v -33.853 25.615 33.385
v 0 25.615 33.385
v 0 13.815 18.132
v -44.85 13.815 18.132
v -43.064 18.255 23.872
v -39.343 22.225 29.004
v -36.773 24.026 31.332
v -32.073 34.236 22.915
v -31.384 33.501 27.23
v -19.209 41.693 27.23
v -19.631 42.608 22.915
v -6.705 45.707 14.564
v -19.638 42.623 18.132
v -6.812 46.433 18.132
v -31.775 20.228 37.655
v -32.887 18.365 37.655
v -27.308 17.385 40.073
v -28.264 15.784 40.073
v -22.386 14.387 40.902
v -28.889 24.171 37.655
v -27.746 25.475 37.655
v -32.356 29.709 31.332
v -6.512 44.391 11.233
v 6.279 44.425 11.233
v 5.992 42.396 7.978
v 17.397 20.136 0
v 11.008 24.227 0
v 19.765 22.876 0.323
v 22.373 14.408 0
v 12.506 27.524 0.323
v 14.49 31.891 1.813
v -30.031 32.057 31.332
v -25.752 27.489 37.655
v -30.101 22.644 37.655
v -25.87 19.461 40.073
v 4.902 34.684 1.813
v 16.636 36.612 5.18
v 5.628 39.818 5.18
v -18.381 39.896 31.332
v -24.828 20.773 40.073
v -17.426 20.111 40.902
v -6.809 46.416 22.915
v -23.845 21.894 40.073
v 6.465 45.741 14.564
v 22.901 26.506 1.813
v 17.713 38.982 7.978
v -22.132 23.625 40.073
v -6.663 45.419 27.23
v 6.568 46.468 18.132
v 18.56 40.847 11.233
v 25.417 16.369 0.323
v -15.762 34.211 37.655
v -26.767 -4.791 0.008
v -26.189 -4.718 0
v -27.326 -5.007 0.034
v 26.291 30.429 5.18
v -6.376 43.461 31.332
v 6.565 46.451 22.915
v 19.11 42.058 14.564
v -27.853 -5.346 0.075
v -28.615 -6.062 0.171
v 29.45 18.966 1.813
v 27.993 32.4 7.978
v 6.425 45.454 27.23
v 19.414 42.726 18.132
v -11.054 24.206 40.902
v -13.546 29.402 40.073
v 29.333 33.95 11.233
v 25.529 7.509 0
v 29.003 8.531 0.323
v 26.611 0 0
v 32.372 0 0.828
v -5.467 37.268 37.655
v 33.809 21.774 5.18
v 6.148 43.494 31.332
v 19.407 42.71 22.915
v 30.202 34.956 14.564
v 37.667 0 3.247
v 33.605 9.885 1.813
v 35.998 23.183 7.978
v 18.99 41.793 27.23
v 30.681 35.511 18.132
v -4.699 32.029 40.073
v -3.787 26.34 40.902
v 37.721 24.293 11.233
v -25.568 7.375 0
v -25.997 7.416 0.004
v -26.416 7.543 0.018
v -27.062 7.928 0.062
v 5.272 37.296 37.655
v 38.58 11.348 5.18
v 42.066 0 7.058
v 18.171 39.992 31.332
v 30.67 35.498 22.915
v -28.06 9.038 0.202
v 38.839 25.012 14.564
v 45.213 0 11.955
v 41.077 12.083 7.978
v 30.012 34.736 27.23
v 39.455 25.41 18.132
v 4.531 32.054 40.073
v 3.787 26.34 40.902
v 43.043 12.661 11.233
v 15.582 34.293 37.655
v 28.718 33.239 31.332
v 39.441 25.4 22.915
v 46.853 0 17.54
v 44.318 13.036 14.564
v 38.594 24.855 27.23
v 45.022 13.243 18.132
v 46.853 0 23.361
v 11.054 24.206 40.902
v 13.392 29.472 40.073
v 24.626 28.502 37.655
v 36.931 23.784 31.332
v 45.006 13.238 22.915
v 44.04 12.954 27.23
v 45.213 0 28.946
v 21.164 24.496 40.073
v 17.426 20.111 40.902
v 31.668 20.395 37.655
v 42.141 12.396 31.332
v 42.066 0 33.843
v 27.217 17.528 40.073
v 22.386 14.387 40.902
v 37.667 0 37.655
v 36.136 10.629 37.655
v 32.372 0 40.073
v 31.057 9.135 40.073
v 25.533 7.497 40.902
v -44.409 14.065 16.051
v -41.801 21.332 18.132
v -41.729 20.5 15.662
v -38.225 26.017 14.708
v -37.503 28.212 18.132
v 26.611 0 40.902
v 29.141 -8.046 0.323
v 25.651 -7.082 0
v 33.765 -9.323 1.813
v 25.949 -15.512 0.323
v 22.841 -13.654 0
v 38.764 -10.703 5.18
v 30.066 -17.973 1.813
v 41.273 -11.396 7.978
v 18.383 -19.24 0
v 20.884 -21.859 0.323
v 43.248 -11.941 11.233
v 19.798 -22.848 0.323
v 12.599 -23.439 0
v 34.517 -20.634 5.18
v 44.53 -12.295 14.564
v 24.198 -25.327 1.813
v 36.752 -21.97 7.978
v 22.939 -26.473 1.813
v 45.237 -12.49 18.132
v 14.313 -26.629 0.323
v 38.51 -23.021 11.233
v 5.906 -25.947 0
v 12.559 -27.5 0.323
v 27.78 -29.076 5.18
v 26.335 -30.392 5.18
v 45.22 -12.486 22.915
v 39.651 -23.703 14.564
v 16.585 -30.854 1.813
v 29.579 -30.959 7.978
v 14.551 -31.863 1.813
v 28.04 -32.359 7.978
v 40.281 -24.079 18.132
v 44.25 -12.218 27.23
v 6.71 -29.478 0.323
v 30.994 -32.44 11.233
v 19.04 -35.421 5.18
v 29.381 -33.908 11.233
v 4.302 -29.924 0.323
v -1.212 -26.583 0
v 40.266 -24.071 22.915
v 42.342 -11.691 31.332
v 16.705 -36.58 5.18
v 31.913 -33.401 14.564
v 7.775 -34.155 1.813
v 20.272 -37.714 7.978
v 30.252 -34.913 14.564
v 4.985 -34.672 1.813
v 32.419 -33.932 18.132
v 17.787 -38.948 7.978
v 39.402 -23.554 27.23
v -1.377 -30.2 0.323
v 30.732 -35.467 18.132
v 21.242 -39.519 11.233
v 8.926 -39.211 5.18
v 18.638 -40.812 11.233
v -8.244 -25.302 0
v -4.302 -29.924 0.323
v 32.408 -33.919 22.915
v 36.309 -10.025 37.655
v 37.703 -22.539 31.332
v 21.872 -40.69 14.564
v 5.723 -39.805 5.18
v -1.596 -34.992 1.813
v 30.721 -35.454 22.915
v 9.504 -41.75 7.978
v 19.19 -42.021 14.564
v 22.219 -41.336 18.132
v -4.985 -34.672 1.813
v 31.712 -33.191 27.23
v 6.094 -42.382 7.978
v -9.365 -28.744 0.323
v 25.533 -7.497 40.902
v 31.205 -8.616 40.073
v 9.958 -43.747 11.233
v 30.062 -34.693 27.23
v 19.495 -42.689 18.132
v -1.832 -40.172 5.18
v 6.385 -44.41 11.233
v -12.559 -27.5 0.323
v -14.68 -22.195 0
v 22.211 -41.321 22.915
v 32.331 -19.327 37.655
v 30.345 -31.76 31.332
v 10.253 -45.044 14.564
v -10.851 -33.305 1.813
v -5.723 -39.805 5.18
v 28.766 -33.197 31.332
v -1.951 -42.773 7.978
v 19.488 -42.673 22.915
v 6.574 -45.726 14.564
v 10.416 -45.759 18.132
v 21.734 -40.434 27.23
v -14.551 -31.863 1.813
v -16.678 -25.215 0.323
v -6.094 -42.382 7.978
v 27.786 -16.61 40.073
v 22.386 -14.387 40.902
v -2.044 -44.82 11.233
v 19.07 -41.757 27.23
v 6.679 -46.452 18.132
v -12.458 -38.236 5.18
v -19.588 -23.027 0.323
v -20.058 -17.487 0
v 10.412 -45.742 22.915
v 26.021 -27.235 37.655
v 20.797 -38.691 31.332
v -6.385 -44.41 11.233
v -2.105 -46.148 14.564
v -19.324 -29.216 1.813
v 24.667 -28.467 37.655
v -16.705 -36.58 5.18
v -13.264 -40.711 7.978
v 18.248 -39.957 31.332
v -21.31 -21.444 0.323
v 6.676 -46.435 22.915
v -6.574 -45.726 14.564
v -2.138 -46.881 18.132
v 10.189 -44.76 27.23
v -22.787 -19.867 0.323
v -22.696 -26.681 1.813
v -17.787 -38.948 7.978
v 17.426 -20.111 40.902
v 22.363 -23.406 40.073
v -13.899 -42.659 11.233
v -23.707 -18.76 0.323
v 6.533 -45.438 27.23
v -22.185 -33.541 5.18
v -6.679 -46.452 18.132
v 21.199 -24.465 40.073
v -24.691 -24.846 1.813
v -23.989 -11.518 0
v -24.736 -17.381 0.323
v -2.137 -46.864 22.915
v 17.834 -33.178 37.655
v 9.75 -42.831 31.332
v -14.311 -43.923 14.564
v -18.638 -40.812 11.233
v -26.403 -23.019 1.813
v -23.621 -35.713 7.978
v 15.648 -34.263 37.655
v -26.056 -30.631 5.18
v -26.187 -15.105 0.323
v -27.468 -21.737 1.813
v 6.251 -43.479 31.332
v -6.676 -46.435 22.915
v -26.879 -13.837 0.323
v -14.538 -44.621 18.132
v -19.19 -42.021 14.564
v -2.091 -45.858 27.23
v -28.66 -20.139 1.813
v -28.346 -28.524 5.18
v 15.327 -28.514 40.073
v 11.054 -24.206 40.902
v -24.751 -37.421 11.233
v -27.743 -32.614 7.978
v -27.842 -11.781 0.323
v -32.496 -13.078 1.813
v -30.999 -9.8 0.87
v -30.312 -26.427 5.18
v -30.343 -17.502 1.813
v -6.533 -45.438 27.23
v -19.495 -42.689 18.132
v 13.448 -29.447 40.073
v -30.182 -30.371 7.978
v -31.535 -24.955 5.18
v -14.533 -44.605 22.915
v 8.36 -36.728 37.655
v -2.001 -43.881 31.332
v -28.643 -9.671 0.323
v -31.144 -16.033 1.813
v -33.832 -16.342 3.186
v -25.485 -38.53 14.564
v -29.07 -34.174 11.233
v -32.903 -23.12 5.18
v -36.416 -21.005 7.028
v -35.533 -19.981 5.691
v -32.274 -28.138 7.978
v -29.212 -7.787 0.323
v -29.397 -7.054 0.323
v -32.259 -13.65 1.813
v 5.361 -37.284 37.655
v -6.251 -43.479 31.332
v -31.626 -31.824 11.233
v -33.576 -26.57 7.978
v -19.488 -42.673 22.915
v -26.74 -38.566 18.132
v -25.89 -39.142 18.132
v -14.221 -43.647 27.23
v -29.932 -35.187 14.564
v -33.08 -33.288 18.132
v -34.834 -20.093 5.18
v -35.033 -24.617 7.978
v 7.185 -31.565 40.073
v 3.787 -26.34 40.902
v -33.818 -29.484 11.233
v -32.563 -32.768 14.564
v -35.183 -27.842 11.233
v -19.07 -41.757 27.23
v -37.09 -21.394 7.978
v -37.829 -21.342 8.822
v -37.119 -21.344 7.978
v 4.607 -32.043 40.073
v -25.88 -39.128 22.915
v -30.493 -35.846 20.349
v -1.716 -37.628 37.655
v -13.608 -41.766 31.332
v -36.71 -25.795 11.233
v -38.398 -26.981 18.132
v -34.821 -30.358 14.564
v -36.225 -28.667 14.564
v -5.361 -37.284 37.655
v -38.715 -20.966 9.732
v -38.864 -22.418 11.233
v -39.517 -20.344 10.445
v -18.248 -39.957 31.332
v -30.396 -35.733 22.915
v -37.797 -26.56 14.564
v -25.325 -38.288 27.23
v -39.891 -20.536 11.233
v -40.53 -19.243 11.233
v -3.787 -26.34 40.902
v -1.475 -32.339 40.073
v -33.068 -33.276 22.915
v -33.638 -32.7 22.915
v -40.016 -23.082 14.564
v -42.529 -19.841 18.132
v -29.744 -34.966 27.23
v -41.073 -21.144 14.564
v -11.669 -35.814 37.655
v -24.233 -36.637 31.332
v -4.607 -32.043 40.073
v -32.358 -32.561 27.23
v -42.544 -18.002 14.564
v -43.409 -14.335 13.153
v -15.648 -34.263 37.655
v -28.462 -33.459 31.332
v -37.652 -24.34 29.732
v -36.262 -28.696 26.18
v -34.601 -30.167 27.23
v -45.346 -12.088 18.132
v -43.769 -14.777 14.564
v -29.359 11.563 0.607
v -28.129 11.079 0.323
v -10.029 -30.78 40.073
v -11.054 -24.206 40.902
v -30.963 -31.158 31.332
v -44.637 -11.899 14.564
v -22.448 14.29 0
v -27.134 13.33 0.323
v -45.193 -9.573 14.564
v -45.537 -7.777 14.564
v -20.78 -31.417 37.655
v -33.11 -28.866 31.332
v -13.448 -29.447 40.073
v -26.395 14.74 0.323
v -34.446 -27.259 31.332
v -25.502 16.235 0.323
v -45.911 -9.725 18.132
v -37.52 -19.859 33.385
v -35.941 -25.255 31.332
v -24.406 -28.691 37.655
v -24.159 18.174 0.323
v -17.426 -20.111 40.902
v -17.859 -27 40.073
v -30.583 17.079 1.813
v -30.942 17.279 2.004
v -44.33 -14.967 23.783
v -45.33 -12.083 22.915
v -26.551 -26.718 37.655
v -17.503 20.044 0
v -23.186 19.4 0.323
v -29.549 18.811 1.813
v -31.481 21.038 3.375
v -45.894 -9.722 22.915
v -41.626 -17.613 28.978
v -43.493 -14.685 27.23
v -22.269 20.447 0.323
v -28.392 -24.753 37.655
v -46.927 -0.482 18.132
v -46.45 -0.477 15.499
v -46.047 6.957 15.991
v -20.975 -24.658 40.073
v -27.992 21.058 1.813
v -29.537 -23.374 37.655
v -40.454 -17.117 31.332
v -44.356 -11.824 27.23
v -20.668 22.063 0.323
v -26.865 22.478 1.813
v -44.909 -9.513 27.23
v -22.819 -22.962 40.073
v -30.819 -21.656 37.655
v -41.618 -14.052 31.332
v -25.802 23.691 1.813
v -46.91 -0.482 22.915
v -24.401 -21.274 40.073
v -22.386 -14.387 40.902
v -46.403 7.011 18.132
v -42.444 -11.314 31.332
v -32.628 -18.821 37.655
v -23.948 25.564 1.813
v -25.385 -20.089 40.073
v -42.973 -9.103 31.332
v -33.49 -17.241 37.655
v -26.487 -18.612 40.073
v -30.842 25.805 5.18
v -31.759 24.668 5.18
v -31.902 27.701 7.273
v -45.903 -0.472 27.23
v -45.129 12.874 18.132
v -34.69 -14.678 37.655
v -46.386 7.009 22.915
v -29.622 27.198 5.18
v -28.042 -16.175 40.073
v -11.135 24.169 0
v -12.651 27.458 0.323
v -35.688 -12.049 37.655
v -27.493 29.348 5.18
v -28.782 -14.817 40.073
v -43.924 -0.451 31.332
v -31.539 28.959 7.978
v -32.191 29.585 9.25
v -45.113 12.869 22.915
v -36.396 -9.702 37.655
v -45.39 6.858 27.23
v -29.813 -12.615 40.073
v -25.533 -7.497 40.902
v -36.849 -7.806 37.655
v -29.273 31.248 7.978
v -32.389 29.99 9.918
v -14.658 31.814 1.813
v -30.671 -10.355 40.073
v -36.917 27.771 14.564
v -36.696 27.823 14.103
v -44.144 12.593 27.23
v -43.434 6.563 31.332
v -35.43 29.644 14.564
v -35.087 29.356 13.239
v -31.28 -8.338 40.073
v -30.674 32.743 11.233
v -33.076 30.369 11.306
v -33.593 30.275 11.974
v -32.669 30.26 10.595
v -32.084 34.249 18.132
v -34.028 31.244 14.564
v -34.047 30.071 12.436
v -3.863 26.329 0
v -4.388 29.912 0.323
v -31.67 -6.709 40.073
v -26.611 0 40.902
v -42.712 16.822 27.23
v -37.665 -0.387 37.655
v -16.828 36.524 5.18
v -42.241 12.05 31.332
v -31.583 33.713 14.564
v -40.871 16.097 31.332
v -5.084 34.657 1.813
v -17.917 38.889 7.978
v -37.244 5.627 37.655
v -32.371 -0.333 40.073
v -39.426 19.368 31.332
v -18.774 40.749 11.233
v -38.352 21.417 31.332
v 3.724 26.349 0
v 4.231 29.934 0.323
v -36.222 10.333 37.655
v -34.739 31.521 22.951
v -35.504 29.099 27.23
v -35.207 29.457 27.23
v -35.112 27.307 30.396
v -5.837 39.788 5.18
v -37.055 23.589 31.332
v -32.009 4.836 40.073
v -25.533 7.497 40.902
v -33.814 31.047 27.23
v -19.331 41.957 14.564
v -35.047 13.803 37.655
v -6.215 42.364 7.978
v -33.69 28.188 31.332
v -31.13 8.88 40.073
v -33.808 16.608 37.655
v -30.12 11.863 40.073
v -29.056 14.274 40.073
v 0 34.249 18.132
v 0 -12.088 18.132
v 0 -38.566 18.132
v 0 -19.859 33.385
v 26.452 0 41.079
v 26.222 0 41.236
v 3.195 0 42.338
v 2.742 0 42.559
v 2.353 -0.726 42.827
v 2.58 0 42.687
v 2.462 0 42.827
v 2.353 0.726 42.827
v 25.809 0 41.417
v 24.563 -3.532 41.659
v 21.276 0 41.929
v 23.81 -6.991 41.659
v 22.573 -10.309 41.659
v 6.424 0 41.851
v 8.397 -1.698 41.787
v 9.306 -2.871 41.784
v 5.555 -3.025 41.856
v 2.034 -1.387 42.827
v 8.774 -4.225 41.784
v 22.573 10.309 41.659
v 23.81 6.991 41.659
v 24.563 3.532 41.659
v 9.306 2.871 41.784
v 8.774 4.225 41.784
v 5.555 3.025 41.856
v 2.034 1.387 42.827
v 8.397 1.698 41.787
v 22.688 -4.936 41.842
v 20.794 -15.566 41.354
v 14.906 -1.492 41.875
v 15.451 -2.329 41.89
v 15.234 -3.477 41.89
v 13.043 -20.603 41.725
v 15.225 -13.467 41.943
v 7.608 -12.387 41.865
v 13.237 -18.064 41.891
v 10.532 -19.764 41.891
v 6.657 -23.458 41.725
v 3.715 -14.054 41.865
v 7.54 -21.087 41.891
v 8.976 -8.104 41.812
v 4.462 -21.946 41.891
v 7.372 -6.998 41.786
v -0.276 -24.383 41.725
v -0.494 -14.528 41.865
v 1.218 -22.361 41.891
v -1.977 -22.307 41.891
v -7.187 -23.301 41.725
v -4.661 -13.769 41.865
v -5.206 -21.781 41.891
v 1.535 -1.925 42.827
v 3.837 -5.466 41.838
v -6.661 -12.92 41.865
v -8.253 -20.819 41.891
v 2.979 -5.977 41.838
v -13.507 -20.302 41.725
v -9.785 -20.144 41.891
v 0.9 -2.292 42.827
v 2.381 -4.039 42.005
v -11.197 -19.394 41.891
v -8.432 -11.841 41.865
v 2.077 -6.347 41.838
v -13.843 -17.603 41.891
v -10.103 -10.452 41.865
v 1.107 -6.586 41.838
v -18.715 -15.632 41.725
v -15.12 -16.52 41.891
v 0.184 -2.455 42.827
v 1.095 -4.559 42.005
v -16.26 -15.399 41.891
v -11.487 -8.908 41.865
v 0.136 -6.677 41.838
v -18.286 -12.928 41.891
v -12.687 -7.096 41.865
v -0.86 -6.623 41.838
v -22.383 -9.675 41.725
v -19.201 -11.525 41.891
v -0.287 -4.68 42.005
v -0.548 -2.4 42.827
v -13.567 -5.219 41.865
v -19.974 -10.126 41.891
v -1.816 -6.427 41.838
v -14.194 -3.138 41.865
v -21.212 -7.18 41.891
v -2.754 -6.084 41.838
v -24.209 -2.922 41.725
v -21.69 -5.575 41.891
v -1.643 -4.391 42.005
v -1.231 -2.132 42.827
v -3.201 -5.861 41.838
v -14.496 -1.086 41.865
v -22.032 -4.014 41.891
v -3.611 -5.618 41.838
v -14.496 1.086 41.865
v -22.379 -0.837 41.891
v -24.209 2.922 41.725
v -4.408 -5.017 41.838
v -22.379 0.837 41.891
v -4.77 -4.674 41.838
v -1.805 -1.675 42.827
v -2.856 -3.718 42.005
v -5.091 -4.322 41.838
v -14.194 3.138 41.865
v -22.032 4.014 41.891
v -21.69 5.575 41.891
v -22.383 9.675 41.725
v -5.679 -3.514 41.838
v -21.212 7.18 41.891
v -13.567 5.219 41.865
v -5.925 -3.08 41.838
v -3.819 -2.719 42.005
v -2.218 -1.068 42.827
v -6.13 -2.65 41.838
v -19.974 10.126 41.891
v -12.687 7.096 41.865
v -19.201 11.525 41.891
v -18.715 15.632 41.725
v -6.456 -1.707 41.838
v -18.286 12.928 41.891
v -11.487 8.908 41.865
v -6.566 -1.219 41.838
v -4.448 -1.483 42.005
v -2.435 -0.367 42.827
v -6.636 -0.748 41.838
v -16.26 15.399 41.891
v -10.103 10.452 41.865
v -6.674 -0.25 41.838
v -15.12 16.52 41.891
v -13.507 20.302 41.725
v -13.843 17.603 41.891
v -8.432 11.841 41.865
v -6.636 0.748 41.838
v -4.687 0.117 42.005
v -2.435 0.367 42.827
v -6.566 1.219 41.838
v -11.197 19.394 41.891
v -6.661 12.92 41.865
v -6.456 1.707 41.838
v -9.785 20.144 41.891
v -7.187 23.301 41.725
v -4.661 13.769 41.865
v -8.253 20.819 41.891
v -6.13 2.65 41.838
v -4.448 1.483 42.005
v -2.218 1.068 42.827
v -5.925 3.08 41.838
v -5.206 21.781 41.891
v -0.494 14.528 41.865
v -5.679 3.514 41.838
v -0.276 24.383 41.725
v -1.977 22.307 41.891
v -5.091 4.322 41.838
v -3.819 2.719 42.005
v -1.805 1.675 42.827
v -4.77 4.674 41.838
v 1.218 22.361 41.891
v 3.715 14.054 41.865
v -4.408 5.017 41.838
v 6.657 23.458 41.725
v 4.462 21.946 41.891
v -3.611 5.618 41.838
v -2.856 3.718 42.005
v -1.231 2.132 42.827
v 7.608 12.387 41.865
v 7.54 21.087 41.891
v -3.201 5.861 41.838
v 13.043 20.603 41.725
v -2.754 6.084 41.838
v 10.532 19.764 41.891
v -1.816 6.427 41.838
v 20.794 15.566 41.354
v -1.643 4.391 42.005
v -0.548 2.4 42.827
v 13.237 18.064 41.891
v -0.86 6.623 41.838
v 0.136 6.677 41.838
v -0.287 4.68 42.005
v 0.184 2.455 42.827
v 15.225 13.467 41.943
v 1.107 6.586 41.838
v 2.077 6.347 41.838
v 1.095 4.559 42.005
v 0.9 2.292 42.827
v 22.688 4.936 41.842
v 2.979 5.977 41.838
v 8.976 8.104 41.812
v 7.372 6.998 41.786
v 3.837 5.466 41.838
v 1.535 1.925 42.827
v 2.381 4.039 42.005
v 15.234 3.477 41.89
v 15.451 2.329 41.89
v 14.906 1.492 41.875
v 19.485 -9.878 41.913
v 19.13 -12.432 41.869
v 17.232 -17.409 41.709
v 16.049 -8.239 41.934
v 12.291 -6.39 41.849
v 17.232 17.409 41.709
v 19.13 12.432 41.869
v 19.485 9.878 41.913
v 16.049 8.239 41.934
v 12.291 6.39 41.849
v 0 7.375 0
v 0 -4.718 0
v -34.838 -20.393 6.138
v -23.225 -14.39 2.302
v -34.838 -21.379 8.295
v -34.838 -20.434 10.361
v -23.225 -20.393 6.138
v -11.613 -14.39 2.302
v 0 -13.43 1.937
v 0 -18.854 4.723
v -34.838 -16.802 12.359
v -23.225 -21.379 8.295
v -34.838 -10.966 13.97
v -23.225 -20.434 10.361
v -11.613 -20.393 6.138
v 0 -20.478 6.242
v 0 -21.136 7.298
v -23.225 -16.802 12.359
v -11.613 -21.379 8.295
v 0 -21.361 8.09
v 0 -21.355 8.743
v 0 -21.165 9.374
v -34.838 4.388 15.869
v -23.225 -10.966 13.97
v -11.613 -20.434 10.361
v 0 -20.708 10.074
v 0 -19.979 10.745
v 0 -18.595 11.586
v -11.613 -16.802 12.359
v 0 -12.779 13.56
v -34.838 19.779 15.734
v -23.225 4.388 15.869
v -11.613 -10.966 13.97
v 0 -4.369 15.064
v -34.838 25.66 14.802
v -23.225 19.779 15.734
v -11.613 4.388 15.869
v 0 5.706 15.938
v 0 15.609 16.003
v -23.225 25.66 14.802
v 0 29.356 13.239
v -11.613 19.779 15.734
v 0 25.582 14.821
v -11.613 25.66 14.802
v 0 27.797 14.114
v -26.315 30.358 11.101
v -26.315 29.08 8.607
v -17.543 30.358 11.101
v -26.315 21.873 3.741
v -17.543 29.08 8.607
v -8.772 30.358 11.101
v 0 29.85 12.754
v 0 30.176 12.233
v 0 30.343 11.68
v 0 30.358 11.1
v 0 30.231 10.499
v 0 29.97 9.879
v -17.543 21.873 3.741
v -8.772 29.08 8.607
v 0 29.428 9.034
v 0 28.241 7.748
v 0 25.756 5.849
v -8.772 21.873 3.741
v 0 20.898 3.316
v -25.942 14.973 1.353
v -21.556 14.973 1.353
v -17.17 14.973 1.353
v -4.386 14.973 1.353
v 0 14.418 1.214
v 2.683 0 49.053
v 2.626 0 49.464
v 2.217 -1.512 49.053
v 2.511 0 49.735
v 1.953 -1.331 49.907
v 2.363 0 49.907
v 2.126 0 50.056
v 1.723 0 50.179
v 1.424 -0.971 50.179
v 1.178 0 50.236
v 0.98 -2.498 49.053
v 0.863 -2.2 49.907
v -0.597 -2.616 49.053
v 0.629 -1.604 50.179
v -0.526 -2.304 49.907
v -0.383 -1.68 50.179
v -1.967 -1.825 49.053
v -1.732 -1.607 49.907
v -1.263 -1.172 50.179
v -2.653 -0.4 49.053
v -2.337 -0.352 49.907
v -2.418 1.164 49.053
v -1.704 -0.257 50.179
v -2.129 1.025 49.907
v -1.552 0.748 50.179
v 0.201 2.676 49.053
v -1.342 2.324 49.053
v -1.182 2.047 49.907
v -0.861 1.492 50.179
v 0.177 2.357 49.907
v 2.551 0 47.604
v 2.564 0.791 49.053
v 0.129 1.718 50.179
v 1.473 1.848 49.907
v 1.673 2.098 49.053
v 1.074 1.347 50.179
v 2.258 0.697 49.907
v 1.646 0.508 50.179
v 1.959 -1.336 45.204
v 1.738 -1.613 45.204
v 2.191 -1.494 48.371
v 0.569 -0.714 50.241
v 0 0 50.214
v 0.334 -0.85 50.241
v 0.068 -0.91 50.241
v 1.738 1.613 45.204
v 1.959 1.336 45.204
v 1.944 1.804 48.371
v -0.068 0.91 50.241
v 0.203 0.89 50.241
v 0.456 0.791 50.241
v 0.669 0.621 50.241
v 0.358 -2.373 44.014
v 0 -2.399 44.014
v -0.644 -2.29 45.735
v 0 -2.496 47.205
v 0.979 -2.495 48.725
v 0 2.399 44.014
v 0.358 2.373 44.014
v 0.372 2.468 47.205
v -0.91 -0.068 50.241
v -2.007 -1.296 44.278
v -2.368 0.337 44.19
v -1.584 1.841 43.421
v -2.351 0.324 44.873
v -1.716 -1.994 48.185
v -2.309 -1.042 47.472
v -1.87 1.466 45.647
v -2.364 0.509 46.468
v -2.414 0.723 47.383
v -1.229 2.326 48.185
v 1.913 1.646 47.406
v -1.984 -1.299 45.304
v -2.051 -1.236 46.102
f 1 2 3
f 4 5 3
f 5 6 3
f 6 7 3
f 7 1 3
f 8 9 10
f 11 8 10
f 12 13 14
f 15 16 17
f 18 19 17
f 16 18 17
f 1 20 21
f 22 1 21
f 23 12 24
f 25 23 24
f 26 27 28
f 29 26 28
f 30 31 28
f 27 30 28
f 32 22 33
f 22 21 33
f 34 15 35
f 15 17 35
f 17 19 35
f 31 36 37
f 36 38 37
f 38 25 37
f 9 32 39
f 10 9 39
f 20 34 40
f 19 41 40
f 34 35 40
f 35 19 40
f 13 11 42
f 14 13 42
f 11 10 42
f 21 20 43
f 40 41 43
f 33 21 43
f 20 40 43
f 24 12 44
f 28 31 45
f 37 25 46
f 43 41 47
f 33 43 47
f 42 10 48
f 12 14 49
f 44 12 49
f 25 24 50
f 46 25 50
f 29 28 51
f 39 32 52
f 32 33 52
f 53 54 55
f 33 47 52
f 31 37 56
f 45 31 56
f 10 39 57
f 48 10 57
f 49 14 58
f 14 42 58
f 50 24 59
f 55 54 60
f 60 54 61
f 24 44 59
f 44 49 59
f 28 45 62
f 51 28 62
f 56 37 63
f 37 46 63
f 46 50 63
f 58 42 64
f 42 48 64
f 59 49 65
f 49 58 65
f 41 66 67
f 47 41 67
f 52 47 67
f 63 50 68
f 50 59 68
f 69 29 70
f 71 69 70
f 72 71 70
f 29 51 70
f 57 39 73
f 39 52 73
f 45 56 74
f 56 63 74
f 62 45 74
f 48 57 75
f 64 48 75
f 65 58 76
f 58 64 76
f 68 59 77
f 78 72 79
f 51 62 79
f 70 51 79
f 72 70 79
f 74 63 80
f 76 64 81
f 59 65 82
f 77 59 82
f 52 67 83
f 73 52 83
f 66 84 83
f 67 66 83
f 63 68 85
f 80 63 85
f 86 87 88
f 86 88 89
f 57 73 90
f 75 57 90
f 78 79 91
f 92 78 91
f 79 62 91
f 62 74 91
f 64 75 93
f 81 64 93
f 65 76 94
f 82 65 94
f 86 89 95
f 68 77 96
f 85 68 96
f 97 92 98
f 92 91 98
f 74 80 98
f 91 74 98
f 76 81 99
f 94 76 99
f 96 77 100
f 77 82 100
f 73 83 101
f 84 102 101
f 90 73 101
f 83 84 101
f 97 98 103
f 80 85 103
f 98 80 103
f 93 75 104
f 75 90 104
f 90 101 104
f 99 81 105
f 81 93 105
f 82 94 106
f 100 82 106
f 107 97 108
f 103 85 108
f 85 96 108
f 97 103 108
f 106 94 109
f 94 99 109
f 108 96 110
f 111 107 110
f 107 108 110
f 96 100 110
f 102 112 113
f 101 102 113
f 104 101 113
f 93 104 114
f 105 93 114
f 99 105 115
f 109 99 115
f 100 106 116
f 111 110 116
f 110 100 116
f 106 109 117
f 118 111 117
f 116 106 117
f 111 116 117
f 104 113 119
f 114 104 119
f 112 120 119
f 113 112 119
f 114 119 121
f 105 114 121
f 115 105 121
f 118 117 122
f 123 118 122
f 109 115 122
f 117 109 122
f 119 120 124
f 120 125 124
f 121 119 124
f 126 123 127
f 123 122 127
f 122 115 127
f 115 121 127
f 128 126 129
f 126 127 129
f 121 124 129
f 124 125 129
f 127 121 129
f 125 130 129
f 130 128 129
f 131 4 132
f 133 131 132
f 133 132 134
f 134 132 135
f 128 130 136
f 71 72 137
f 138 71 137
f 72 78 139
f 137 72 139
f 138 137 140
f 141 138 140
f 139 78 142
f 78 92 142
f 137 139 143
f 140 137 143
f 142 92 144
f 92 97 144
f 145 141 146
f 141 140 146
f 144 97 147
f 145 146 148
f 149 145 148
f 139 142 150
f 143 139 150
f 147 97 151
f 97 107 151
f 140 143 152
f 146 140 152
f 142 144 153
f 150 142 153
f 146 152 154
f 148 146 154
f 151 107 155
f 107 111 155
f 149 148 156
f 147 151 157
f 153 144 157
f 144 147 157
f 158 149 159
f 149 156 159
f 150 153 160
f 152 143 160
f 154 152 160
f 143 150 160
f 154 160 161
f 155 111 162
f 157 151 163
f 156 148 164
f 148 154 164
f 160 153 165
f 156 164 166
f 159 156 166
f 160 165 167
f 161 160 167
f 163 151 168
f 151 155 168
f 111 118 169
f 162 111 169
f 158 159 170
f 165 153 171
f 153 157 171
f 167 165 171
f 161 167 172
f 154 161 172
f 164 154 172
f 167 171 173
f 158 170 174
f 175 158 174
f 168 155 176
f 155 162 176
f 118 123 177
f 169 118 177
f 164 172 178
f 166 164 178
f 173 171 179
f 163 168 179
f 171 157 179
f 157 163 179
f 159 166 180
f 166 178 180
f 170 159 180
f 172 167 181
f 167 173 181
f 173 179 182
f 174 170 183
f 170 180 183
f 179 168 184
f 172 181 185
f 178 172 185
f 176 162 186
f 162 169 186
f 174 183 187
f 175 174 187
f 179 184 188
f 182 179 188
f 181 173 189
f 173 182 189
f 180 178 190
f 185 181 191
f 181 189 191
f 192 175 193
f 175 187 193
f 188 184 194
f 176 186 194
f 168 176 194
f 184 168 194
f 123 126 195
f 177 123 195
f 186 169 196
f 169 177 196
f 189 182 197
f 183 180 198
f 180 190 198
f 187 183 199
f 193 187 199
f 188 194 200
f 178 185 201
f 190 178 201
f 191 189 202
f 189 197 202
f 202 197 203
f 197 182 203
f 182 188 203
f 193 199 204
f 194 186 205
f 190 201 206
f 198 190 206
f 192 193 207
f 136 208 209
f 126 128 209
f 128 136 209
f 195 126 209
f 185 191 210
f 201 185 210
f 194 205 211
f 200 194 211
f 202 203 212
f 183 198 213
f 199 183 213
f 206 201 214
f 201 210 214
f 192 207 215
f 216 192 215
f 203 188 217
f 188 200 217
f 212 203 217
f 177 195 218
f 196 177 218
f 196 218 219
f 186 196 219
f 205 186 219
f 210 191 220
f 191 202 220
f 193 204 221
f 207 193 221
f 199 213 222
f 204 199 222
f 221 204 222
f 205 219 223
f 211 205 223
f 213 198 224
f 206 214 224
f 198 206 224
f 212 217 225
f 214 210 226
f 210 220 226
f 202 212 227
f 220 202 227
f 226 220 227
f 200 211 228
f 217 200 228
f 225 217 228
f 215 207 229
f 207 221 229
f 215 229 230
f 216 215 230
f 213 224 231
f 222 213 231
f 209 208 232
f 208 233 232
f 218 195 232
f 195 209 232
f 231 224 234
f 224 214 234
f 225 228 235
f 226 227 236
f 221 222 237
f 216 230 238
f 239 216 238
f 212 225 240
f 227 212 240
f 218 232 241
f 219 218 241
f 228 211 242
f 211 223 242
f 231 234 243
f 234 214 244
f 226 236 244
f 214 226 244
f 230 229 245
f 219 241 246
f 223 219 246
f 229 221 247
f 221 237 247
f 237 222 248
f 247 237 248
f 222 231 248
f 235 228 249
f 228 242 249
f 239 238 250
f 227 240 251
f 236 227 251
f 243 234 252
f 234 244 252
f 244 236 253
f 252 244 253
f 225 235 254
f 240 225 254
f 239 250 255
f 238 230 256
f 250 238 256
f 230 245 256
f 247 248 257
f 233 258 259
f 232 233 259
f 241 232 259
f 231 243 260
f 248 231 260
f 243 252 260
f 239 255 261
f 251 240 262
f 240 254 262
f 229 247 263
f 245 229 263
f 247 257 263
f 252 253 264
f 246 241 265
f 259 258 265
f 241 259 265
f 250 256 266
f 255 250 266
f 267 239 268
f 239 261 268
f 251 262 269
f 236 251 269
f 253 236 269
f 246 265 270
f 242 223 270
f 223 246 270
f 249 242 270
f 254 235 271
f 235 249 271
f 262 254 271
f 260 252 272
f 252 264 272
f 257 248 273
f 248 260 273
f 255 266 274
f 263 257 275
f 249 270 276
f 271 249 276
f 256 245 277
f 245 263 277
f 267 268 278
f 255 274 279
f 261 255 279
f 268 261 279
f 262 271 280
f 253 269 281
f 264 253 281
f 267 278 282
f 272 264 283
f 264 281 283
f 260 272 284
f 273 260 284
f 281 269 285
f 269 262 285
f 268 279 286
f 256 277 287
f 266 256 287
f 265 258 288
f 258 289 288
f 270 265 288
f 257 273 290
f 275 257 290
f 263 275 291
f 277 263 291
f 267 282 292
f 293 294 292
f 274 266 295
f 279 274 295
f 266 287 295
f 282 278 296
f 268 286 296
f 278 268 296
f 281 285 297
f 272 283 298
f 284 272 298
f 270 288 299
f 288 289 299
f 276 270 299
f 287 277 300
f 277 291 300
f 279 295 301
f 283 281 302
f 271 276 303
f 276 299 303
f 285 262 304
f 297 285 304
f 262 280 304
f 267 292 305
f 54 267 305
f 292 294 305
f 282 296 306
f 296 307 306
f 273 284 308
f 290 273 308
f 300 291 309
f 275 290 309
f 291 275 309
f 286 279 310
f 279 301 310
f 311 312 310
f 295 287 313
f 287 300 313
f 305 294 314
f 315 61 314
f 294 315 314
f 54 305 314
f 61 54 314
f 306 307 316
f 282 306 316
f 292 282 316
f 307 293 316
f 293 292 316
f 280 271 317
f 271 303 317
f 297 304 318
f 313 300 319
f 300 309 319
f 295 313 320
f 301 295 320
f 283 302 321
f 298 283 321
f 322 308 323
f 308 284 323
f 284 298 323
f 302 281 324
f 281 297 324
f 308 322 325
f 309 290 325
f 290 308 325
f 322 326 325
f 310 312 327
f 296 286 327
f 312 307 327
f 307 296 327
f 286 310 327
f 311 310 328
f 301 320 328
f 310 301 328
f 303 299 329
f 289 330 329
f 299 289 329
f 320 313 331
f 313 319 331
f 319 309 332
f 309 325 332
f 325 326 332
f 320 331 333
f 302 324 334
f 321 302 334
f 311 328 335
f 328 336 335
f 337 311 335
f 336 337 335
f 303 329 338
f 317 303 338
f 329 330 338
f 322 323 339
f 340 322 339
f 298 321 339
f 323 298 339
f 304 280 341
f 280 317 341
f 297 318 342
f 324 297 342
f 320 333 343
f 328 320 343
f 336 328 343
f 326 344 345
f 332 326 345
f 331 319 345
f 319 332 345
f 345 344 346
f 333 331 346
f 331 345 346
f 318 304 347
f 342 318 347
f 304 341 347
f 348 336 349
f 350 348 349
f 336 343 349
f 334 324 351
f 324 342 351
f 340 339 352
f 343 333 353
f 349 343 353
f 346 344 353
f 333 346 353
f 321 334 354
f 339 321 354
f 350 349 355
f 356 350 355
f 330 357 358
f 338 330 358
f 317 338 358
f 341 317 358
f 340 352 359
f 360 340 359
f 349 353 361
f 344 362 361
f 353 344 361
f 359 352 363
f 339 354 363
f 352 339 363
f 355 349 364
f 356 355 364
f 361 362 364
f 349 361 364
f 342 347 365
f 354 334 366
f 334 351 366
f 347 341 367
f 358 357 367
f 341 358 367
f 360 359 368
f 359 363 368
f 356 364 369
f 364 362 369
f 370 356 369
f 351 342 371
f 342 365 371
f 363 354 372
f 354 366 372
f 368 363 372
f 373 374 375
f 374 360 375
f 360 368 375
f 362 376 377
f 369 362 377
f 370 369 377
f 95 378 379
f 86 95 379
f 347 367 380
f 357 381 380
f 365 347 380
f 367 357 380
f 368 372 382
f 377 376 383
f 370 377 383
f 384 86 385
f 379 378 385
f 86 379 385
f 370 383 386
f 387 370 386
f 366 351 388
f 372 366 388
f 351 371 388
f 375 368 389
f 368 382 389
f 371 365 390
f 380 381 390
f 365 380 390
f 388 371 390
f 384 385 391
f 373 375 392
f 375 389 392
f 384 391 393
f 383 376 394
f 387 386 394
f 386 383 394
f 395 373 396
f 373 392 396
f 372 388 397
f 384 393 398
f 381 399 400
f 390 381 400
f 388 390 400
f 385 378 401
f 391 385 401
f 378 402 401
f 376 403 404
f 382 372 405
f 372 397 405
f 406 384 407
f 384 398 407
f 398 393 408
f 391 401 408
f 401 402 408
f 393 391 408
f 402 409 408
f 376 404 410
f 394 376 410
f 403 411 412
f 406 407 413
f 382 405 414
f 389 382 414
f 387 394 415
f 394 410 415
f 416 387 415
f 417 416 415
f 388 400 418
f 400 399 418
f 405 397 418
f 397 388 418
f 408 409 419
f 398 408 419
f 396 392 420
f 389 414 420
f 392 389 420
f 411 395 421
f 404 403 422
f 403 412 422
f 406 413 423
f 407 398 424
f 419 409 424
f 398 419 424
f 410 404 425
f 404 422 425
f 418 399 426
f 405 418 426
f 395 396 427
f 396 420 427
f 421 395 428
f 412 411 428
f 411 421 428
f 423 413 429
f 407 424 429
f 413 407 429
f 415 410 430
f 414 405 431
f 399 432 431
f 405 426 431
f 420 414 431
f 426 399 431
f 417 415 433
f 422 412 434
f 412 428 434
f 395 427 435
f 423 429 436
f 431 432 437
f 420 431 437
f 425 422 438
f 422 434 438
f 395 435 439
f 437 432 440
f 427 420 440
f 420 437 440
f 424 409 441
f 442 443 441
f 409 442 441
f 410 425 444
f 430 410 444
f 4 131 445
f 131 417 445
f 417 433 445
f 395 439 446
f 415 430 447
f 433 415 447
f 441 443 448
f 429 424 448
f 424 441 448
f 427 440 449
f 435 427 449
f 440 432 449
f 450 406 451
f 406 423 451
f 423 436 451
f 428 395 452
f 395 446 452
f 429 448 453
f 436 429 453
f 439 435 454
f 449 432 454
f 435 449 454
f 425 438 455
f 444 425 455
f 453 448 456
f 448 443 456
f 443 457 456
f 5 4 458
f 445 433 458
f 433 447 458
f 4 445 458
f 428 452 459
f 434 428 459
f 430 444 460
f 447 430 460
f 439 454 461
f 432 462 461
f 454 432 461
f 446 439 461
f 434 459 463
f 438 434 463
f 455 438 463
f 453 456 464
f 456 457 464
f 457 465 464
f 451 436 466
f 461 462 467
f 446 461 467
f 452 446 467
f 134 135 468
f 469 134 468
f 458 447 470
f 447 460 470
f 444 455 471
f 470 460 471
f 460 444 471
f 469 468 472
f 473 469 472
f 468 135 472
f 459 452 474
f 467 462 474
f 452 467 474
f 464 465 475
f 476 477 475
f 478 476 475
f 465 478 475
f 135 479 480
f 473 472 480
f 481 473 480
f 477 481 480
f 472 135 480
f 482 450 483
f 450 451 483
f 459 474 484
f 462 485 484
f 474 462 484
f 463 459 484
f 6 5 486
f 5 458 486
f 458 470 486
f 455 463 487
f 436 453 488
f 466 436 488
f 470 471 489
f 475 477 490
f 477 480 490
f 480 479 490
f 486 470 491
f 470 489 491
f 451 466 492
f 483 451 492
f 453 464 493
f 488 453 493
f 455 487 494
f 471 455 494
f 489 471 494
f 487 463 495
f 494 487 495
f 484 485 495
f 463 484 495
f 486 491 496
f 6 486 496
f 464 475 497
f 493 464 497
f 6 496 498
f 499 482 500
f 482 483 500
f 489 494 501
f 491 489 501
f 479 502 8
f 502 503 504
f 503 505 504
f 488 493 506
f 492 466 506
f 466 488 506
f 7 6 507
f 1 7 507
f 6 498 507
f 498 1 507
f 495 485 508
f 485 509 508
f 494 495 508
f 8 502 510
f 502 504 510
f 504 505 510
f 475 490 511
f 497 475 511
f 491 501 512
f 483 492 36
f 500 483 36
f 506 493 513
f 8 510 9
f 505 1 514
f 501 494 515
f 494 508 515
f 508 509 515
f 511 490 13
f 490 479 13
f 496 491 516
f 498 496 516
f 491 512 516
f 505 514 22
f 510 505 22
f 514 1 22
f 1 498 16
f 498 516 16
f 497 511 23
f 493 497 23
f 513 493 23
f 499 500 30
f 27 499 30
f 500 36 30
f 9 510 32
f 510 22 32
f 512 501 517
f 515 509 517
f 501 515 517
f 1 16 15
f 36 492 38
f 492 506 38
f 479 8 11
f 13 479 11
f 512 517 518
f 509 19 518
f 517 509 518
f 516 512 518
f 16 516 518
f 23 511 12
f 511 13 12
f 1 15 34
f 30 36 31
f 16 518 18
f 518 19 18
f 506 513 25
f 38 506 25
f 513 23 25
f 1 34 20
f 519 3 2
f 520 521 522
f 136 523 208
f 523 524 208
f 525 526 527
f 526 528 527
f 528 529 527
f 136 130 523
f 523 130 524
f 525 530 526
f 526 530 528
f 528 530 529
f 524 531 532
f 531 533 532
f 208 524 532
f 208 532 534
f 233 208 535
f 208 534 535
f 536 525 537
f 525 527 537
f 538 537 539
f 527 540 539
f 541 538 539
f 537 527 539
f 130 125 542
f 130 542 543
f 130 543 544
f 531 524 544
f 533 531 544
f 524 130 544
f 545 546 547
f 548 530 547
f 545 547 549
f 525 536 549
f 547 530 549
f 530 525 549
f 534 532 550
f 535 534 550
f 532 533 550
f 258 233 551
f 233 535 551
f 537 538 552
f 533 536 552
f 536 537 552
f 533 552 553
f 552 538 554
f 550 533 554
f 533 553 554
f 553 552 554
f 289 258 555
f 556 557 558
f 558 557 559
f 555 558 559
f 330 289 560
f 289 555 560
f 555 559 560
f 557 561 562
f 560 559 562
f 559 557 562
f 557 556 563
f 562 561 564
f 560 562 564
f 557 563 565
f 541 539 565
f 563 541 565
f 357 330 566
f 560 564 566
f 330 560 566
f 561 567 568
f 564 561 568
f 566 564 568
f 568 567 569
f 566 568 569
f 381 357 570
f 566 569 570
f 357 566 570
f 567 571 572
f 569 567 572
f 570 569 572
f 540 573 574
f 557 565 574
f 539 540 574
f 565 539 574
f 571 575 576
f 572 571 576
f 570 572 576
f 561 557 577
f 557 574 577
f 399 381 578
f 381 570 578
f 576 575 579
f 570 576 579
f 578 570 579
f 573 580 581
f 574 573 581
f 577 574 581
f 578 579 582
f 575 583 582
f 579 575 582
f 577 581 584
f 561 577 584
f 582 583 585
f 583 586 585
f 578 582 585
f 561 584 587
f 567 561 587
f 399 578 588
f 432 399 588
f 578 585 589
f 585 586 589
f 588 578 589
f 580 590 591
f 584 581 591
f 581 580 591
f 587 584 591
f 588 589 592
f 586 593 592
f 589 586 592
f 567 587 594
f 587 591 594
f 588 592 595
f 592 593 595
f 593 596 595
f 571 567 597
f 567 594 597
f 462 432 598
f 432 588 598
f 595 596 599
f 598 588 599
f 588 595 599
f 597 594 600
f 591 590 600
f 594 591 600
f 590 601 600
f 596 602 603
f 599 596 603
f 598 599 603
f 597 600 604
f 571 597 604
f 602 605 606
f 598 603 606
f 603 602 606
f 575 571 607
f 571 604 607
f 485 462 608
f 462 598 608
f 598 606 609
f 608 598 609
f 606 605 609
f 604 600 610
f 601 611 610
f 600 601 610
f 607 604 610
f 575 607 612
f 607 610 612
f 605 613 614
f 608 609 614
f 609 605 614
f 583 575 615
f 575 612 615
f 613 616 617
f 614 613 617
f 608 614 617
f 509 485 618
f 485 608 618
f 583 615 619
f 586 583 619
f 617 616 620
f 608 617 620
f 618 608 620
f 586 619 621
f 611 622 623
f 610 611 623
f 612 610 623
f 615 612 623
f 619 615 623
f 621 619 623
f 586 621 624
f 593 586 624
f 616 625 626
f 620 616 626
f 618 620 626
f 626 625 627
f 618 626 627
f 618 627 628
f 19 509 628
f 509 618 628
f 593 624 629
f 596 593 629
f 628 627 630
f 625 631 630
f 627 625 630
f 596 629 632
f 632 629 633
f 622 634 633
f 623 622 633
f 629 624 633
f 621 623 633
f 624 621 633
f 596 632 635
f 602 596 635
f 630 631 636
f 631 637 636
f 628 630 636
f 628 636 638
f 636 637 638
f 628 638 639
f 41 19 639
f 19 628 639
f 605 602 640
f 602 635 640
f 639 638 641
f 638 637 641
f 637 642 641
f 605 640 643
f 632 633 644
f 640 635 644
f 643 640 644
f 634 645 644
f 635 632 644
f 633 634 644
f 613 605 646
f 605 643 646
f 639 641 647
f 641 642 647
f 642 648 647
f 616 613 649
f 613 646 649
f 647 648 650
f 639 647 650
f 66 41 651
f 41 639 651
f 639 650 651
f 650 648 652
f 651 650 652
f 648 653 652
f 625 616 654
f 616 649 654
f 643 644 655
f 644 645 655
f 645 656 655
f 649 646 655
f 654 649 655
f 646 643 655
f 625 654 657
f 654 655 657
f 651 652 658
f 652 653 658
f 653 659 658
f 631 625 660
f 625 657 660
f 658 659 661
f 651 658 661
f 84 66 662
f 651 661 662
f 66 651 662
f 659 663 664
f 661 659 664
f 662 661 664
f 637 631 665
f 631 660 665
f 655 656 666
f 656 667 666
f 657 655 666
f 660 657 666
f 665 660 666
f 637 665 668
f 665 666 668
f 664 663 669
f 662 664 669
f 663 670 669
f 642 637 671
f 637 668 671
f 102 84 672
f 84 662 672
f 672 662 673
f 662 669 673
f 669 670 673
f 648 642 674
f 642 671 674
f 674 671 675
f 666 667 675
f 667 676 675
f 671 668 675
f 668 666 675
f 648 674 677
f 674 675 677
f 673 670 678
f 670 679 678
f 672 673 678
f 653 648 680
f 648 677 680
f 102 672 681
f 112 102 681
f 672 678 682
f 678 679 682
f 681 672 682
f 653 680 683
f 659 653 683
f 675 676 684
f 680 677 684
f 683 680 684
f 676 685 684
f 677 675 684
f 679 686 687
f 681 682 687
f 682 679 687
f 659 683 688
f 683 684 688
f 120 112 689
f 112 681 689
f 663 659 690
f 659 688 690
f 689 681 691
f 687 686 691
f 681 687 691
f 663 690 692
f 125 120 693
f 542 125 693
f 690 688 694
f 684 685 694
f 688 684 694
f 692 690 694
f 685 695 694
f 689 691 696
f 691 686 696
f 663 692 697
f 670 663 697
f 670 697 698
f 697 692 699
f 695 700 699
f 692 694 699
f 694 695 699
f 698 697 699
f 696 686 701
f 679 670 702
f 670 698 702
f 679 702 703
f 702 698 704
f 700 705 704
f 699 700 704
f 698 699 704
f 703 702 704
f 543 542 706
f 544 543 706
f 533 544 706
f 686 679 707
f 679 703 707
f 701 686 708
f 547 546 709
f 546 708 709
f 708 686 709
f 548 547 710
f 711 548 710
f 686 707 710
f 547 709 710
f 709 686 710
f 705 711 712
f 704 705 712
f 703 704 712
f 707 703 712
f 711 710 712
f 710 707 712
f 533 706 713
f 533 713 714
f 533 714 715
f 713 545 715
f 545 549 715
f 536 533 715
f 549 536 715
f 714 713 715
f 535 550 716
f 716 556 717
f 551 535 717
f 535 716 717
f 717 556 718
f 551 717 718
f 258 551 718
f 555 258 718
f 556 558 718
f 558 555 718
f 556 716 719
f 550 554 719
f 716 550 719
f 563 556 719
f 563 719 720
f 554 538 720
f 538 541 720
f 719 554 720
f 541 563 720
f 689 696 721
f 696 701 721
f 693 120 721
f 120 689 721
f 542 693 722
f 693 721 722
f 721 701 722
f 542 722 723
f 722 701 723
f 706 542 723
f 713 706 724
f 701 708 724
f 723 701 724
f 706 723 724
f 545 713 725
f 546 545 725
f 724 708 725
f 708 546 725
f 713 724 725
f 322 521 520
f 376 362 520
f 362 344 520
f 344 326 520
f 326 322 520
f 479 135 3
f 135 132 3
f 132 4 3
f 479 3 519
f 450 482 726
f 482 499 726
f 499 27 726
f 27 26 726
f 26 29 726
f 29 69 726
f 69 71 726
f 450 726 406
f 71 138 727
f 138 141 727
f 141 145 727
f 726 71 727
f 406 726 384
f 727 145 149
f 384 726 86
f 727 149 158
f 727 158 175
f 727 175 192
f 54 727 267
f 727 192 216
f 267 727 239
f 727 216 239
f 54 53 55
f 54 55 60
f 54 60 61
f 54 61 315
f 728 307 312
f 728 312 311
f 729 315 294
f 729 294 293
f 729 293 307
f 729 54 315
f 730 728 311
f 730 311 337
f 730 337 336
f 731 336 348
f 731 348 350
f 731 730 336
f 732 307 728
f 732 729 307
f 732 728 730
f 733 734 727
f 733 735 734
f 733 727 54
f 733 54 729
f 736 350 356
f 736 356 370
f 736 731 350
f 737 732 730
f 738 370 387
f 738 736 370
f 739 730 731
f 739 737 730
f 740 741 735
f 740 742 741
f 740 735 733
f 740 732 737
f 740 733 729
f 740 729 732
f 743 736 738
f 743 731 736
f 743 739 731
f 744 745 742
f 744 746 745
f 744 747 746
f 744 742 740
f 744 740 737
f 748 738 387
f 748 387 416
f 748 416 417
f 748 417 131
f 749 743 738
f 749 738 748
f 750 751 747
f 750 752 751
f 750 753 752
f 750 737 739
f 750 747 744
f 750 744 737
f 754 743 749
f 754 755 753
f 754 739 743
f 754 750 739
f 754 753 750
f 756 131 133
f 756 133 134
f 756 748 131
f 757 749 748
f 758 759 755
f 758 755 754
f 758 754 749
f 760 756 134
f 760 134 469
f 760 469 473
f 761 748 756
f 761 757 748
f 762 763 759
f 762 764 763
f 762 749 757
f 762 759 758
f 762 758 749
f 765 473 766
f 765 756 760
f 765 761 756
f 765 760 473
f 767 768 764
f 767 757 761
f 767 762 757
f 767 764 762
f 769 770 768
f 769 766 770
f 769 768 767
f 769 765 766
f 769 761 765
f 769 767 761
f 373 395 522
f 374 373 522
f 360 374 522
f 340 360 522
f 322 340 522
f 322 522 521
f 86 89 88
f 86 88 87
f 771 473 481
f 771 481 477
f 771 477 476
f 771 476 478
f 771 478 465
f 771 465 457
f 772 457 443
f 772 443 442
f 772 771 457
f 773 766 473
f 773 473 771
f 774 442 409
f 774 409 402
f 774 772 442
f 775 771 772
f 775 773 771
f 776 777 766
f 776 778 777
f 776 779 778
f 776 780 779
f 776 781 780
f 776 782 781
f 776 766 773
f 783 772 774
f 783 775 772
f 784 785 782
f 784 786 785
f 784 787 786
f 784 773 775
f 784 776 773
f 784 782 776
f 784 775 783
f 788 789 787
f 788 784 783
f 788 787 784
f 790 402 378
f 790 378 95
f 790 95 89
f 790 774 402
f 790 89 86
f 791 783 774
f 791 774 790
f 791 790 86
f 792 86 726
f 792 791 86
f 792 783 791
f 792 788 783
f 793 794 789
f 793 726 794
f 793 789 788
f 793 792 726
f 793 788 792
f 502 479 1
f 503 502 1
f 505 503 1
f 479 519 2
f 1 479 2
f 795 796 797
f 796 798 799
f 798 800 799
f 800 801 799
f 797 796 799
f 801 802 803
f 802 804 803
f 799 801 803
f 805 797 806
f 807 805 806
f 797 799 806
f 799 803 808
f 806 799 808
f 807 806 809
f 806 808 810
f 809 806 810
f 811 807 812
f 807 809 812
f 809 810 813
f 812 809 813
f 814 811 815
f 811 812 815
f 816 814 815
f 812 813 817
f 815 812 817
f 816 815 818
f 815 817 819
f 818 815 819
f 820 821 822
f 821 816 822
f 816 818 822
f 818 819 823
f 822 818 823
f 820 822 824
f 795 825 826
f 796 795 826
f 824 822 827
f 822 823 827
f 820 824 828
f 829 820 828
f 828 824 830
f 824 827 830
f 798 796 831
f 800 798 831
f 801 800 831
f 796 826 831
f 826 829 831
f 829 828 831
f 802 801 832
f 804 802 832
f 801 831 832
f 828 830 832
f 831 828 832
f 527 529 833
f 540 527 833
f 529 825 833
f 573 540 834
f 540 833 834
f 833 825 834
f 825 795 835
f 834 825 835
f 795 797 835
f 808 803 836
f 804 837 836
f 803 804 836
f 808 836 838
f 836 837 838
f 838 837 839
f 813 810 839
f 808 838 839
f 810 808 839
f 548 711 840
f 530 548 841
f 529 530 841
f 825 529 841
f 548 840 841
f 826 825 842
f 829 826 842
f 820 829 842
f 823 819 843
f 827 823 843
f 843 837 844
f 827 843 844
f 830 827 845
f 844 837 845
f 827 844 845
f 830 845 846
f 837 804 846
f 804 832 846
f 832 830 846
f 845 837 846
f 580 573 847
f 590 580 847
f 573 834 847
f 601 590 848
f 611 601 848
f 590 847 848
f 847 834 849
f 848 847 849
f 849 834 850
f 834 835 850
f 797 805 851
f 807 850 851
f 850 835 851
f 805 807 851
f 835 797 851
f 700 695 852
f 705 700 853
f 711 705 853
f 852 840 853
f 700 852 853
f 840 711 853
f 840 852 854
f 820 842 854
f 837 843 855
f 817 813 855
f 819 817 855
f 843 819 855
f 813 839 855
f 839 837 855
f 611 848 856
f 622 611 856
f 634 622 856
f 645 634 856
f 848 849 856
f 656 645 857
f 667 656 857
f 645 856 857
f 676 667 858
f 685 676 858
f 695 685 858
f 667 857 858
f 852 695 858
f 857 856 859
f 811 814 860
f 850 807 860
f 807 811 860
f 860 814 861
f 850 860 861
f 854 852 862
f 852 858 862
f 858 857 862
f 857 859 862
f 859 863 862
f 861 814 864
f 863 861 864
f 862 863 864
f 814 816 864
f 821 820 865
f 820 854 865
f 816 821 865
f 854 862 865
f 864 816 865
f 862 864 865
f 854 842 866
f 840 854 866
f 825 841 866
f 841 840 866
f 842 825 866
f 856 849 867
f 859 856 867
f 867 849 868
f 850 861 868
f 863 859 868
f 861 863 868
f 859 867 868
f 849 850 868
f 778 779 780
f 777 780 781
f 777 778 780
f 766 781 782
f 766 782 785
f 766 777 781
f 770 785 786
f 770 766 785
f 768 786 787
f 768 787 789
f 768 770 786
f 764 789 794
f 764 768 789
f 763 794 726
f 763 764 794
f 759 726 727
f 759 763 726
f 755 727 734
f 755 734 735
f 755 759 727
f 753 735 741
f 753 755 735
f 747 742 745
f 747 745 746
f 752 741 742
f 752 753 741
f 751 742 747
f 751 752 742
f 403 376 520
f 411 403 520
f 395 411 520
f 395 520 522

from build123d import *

# Parameters (mm, degrees)
F3_DEPTH = 127
F5_DEPTH = 50.8


with BuildPart() as f1:
    # F0 (on Front) → F1 (revolve)
    with BuildSketch(Plane.XZ):
        with BuildLine():
            Line((0, 50.2139851451), (0, 0))
            Line((0, 0), (26.6106016934, 0))
            ThreePointArc((26.6106016934, 0), (47.0614731312, 20.4508714378), (26.6106016934, 40.9017428756))
            add(Edge.make_bspline(
                [(26.6106016934, 40.9017428756), (25.0362083316, 43.3508008718), (4.0366263129, 40.3783917427), (2.4622329511, 42.827449739)],
                knots=[0, 0, 0, 0, 24.2250296148, 24.2250296148, 24.2250296148, 24.2250296148], degree=3))
            add(Edge.make_bspline(
                [(2.4622329511, 42.827449739), (2.3834565669, 44.1874180439), (2.2387711309, 46.6852174669), (3.1683927039, 50.3577171038), (1.0311299141, 50.2607616454), (0, 50.2139851451)],
                knots=[0, 0, 0, 0, 0.3821769351, 0.7019290997, 1, 1, 1, 1], degree=3))
        make_face()
    revolve(axis=Axis((0, 0, 15.449039638), (0, 0, -1)))

    # F2 (on Right) → F3 (cut)
    with BuildSketch(Plane.YZ):
        Polygon((-19.8585987091, 33.3854667842), (-38.5659709573, 18.131762743), (-12.0878415182, 18.131762743), align=None)
        Polygon((25.6147161126, 33.3854667842), (13.814676553, 18.131762743), (34.2488847673, 18.131762743), align=None)
    extrude(amount=-F3_DEPTH, mode=Mode.SUBTRACT)

    # F4 (on Right) → F5 (cut)
    with BuildSketch(Plane.YZ):
        with BuildLine():
            add(Edge.make_bspline(
                [(29.3561853468, 13.2390642539), (32.4553857355, 10.7557147244), (20.3203773982, -0.772276878), (-12.8022721153, -1.9722855331), (-31.1402784868, 15.2170824896), (23.0618669435, 18.2826208766), (29.3561853468, 13.2390642539)],
                knots=[0, 0, 0, 0, 0.1761748956, 0.4813955957, 0.6421977451, 1, 1, 1, 1], degree=3))
        make_face()
    extrude(amount=-F5_DEPTH, mode=Mode.SUBTRACT)


solid = f1.part
